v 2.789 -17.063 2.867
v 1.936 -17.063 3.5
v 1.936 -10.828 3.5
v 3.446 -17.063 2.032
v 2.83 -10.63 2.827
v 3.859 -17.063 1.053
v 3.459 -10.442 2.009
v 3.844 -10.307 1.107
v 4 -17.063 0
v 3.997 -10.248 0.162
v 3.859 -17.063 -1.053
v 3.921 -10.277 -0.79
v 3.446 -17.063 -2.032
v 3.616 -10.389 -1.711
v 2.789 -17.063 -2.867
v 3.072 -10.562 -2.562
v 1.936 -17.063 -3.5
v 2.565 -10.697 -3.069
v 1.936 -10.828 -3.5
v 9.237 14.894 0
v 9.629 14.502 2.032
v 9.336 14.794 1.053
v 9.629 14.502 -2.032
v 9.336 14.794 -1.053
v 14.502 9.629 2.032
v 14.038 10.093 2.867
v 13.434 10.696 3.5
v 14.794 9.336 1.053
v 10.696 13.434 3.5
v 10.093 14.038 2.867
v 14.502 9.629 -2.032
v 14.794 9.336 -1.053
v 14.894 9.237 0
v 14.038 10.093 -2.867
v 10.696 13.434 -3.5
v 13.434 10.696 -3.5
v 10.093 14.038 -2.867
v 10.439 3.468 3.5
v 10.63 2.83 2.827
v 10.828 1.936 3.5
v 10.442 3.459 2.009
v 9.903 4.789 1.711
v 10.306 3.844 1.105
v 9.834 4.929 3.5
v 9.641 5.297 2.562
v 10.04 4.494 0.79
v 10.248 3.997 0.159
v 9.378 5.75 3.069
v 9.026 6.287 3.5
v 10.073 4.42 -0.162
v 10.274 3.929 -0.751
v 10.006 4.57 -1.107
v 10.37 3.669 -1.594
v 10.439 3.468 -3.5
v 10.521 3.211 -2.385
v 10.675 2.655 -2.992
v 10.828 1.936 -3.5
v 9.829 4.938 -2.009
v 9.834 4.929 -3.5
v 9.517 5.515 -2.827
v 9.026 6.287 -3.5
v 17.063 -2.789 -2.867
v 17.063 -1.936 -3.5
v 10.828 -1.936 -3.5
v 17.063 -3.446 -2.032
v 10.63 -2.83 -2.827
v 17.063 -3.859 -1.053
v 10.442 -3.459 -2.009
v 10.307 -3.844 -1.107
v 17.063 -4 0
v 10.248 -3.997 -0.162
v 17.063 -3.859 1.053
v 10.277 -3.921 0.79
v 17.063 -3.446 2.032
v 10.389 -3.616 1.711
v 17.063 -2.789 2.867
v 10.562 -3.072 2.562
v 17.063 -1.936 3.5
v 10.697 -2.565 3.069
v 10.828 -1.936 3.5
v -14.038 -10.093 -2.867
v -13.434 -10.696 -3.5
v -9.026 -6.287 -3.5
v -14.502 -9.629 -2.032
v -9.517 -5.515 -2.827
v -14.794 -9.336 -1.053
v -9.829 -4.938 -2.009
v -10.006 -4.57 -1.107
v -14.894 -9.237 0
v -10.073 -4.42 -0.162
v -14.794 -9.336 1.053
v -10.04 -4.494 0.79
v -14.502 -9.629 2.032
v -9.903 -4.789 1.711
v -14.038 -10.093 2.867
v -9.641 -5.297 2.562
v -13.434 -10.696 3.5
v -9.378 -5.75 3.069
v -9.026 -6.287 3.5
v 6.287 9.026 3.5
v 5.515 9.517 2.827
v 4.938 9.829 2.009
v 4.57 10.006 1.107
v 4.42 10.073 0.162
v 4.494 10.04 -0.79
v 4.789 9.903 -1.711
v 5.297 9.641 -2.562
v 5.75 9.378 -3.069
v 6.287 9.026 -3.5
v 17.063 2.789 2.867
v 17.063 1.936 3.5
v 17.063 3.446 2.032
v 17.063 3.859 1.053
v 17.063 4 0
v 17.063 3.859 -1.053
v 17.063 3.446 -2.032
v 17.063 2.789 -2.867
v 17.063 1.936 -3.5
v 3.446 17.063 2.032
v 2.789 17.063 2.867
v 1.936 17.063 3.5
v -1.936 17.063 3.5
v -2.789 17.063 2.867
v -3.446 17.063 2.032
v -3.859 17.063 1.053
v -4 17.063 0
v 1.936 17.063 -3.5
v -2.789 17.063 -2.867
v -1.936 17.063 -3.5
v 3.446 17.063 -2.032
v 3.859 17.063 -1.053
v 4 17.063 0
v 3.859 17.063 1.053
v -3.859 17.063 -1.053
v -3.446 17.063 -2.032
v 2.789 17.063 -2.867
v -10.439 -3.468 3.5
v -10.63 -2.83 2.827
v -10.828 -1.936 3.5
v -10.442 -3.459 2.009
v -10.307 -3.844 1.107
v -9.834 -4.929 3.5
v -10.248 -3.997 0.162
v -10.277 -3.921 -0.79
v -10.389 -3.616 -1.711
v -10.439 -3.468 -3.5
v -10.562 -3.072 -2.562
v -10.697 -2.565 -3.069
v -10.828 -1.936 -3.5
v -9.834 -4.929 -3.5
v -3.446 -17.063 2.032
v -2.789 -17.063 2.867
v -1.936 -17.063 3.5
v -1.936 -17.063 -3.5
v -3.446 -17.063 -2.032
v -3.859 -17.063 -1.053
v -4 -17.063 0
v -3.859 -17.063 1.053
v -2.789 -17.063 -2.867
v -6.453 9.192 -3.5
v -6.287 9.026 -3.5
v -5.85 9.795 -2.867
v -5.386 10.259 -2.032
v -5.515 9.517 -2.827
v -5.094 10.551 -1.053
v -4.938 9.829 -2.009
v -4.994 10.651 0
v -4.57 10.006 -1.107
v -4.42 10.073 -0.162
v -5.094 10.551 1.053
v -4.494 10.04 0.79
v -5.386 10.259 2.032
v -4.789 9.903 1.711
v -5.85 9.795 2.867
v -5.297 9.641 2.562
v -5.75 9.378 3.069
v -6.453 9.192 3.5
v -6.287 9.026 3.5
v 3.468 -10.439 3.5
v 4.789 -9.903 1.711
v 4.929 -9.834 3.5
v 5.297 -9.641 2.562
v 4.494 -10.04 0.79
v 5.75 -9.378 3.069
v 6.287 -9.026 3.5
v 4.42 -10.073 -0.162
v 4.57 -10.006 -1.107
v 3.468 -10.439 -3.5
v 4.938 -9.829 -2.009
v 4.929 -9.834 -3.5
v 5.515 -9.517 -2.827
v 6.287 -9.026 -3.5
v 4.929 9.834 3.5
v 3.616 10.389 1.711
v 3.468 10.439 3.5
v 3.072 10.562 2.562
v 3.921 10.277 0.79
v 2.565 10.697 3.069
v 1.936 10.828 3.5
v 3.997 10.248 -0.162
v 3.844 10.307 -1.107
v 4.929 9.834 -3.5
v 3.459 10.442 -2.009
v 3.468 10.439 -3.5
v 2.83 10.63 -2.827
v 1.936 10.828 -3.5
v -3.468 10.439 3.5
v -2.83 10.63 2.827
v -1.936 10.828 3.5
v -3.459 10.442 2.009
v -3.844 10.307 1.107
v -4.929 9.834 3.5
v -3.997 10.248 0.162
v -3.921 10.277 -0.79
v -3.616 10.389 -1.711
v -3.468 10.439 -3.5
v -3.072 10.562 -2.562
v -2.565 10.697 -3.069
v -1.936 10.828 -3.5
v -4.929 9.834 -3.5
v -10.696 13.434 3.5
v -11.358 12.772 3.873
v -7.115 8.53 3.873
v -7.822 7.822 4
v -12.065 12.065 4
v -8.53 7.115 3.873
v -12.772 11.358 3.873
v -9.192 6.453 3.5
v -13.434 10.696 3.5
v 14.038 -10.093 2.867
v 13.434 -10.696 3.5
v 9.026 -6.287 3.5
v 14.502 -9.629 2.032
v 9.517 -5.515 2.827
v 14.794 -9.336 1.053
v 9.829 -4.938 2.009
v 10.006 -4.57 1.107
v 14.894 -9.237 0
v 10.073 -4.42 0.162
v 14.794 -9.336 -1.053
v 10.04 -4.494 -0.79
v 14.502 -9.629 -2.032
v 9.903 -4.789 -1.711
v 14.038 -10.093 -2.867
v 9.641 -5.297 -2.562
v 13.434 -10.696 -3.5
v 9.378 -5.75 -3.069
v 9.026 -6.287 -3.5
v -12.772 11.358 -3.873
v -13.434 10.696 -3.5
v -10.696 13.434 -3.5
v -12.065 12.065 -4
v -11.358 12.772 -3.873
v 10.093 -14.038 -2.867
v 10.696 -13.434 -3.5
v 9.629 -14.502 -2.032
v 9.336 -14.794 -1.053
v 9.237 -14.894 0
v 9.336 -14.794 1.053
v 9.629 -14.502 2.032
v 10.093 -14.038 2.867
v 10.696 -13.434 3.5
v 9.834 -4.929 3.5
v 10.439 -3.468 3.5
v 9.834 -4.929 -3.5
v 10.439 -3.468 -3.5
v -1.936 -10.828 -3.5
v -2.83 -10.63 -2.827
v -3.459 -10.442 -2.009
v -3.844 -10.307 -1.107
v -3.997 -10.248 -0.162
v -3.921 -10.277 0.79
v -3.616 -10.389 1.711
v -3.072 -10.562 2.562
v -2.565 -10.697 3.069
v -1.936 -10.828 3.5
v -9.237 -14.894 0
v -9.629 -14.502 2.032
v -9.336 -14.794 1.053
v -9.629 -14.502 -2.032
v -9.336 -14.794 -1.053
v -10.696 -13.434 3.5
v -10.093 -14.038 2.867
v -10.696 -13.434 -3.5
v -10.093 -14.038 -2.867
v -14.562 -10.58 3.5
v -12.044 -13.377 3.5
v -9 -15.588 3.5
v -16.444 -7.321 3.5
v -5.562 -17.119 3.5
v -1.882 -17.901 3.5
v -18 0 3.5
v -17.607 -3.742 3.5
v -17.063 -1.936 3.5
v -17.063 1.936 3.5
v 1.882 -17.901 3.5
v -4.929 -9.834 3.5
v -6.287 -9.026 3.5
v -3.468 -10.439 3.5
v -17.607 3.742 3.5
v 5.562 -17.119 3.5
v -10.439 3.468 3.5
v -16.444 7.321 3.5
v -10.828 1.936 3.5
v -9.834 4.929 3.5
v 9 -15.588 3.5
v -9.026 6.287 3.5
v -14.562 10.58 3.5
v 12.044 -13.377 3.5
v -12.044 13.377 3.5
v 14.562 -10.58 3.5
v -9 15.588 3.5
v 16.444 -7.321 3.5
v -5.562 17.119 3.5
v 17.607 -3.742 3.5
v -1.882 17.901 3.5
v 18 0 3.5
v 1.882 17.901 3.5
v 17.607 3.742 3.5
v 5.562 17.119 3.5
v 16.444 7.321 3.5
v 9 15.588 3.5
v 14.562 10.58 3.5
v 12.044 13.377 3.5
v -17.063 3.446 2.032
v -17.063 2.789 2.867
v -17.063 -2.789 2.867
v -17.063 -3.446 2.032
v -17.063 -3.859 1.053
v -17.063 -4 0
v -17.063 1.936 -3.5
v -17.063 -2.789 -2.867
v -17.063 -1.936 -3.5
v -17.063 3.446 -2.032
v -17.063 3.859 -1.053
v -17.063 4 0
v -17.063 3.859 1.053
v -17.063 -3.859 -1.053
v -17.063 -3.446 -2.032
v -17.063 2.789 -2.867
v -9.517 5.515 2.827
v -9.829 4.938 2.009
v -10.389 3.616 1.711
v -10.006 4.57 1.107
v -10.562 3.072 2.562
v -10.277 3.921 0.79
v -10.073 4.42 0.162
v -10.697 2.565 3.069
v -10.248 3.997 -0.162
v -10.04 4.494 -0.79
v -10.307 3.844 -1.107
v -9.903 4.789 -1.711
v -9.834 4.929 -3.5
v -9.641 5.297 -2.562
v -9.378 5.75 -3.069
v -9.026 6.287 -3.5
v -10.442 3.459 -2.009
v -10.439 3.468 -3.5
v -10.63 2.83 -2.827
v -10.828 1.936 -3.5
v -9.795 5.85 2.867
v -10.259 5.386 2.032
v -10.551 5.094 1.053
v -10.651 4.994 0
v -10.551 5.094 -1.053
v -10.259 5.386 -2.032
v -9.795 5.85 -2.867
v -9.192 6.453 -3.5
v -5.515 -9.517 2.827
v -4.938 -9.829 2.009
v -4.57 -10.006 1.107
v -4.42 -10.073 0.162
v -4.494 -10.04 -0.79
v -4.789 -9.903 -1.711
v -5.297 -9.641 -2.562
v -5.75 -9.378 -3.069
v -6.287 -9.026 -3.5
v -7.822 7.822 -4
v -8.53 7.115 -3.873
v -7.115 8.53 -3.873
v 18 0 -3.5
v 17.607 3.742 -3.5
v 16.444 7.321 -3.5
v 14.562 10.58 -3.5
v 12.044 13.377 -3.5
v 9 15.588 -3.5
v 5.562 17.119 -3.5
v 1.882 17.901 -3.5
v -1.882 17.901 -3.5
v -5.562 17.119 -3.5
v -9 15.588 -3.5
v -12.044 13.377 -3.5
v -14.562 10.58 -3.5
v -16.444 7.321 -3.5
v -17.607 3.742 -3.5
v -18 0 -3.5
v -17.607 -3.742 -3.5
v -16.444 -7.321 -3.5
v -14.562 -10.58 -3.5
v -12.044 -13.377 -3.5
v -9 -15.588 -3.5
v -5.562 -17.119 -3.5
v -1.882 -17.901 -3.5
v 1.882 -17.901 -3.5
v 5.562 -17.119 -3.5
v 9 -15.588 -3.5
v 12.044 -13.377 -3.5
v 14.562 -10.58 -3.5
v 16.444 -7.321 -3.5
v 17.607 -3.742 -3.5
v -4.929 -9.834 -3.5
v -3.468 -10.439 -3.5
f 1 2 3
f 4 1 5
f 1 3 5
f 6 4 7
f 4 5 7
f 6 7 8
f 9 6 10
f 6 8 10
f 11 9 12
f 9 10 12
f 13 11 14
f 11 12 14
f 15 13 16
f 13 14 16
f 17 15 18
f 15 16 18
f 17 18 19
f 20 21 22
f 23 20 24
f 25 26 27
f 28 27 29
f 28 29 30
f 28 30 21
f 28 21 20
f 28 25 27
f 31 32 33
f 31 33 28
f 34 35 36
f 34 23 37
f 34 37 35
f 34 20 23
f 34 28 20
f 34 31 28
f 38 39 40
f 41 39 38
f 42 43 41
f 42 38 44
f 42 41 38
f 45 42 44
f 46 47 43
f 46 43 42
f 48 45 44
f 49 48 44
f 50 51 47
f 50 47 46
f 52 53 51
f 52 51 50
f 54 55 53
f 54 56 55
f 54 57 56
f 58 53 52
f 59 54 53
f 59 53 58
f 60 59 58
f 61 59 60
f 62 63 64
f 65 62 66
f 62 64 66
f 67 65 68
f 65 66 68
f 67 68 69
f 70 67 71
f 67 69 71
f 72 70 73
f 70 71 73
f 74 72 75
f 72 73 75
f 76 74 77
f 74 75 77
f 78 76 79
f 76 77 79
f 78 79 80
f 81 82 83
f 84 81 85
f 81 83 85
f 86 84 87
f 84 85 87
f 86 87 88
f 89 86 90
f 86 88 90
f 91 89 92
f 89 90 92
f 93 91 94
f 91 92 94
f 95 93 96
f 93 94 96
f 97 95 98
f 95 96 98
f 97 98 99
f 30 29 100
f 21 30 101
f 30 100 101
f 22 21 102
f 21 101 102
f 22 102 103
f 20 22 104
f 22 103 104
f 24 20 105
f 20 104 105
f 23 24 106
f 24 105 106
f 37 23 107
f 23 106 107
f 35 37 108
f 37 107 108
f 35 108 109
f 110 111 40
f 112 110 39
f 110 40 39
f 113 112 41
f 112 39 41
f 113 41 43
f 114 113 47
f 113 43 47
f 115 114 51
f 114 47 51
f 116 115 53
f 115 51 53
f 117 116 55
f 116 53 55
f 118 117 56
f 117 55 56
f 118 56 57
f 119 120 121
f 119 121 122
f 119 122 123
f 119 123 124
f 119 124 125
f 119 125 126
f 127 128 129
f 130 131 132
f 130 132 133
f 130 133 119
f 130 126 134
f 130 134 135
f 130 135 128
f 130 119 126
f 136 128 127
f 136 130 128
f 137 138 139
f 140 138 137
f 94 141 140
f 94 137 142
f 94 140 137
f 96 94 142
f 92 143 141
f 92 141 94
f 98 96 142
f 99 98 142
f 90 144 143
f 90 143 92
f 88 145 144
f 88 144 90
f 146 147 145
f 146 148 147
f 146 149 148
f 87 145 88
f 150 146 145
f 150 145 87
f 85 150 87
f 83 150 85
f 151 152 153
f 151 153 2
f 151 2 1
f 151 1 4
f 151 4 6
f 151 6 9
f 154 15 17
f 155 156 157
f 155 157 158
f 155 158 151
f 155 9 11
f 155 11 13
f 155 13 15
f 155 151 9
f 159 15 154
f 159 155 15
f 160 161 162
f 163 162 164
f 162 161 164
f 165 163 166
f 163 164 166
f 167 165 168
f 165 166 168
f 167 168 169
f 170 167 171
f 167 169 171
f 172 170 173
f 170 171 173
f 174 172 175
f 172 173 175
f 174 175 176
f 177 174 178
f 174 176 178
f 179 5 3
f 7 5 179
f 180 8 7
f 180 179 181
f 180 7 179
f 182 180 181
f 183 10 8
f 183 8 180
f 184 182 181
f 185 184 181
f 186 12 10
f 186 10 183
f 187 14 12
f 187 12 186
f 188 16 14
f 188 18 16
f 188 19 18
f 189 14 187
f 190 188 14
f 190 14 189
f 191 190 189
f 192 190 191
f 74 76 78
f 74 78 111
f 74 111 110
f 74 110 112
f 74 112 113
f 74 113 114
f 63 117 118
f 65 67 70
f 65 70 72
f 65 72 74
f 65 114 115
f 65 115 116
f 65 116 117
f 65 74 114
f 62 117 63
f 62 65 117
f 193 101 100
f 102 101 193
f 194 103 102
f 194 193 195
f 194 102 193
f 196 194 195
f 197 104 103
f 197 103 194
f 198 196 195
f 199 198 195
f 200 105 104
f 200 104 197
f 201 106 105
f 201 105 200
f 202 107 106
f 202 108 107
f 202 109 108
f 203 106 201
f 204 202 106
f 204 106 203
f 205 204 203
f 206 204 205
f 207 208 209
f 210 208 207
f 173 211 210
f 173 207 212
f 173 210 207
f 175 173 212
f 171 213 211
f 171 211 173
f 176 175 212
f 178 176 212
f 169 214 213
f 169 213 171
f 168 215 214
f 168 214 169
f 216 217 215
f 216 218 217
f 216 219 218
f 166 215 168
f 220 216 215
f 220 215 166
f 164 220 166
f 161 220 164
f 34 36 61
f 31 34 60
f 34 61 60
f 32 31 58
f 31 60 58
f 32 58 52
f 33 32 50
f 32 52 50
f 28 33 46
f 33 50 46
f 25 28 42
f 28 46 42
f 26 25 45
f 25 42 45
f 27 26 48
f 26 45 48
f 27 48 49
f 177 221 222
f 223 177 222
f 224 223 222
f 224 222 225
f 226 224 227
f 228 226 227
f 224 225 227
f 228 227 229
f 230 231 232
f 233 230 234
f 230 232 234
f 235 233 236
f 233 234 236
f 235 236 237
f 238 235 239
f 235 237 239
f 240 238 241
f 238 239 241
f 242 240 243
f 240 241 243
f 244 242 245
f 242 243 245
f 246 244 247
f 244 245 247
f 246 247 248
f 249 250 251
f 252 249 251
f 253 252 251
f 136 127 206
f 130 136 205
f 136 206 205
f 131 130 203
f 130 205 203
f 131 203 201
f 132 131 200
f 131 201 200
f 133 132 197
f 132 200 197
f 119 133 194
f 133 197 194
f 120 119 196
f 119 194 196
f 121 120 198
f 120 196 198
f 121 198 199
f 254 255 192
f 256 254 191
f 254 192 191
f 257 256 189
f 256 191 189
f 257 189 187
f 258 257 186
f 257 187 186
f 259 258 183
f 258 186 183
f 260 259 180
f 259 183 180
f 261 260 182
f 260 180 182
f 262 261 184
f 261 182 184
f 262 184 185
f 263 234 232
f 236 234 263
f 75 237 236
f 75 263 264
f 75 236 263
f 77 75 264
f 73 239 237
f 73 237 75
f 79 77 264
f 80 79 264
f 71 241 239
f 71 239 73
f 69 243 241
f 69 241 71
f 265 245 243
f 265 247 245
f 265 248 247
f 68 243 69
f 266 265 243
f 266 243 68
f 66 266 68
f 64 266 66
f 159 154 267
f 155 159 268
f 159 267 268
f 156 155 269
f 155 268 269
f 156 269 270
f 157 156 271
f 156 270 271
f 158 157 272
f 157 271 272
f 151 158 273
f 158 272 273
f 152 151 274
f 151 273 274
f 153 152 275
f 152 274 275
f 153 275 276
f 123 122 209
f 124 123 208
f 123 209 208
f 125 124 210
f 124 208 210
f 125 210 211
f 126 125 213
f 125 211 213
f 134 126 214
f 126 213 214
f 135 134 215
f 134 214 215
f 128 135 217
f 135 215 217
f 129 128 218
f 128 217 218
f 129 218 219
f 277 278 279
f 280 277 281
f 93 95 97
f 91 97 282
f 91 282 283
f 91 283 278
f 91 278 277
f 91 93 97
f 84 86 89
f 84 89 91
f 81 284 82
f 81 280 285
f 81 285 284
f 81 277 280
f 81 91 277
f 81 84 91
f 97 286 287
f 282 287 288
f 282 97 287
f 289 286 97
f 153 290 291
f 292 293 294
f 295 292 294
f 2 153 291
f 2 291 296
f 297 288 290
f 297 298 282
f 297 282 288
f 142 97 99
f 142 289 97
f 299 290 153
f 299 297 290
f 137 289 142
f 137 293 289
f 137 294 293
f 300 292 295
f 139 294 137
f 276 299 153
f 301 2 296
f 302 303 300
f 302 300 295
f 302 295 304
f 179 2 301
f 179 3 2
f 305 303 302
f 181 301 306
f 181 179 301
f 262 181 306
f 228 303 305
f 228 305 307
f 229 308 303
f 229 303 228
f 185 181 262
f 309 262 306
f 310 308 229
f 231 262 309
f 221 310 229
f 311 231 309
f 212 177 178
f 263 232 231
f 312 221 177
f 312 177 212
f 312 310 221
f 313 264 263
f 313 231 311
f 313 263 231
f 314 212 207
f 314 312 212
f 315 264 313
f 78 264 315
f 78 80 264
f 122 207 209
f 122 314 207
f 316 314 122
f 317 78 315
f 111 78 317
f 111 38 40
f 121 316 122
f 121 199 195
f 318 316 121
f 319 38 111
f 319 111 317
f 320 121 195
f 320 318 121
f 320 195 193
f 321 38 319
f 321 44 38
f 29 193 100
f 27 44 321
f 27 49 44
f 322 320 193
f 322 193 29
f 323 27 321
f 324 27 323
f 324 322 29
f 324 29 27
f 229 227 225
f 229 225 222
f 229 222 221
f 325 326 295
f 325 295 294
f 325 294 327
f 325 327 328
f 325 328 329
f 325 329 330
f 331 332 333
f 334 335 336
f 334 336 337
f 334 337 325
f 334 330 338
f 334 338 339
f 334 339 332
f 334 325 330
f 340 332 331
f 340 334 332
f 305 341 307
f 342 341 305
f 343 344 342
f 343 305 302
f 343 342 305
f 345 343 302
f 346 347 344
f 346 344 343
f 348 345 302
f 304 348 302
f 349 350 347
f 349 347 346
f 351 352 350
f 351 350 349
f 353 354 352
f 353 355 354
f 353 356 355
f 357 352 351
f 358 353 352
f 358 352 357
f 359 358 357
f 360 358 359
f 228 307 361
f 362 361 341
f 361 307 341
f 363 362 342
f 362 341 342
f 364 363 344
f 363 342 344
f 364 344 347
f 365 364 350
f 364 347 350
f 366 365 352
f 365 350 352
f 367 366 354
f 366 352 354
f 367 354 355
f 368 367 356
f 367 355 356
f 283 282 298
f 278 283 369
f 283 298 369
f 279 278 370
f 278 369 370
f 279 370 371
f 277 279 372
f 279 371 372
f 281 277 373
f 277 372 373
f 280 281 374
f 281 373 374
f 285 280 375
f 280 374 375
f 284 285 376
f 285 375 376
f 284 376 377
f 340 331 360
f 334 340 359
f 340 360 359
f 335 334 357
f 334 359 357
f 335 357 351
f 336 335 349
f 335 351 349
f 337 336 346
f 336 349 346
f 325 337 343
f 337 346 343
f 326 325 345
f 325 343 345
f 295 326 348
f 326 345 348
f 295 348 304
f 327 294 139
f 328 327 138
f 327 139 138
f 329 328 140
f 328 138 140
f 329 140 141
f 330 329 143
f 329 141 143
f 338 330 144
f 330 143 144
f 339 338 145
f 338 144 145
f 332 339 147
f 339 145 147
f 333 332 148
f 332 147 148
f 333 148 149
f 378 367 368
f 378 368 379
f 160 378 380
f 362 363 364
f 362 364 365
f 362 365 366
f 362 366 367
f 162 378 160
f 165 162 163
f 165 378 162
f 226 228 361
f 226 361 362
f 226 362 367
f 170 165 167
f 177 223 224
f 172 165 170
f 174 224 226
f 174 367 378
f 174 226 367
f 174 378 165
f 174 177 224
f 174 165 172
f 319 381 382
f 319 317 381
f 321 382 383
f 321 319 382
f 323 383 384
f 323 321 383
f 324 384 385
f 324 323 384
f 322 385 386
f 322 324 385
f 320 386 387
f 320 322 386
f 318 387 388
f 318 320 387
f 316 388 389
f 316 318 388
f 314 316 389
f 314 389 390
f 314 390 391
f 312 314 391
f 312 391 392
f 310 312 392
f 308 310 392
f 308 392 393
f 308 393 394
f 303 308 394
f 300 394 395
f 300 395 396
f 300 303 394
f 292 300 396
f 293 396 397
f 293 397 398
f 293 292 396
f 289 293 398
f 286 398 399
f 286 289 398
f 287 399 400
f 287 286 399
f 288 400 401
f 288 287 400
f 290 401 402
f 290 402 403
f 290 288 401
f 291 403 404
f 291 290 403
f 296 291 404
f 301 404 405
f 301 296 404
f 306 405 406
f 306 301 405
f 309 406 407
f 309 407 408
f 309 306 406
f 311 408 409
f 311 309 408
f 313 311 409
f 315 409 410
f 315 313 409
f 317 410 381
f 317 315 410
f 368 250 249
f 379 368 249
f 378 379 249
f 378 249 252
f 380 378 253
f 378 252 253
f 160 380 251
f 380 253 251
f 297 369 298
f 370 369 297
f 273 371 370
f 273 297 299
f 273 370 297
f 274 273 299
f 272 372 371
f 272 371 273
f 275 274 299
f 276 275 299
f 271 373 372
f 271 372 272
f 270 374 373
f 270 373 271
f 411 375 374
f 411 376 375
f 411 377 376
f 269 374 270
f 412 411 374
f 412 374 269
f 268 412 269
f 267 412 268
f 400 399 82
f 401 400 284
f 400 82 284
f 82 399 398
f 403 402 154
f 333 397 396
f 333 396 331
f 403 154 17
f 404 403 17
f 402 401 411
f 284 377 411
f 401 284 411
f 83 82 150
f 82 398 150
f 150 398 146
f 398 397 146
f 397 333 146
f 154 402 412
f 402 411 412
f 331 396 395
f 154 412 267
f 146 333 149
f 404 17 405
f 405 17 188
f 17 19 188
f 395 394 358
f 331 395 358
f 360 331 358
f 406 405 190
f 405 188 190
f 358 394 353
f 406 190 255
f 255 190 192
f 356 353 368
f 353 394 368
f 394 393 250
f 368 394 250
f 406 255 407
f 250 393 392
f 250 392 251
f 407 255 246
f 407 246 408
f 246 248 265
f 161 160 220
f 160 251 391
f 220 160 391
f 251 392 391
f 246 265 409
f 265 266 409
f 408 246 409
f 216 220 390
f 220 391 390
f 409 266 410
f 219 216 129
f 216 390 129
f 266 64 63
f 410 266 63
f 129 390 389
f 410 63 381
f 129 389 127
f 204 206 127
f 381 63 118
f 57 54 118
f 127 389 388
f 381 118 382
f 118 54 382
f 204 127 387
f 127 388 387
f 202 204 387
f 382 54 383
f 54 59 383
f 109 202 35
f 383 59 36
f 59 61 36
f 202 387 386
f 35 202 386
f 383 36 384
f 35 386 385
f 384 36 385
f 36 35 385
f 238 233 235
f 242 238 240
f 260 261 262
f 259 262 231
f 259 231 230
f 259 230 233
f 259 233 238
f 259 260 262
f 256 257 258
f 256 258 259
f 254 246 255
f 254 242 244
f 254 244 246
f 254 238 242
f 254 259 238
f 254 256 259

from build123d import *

# Parameters (mm, degrees)
SKETCH1_R                   = 18
SKETCH1_R_2                 = 11
BOSS_EXTRUDE1_DEPTH         = 3.5
SKETCH4_R                   = 4
CUT_EXTRUDE1_DEPTH          = 6.9
CIRPATTERN1_COUNT           = 8
SKETCH5_R                   = 4
SPACECLAIM_FOR_MAGNET_DEPTH = 6


with BuildPart() as part:
    # Sketch1 → Boss-Extrude1 (new, symmetric)
    with BuildSketch(Plane.XY):
        Circle(SKETCH1_R)
        Circle(SKETCH1_R_2, mode=Mode.SUBTRACT)
    extrude(amount=BOSS_EXTRUDE1_DEPTH, both=True)

    # Sketch4 → Cut-Extrude1 (cut)
    with BuildSketch(Plane(origin=(-10.162674858, 0, 0), x_dir=(0, 0, -1), z_dir=(1, 0, 0))):
        Circle(SKETCH4_R)
    cut_extrude1 = extrude(amount=-CUT_EXTRUDE1_DEPTH, mode=Mode.SUBTRACT)

    # CirPattern1: Cut-Extrude1 ×8 about axis
    cirpattern1_axis = Axis((0, 0, 3.5), (0, 0, -1))
    for i in range(1, CIRPATTERN1_COUNT):
        add(cut_extrude1.rotate(cirpattern1_axis, i * 360 / CIRPATTERN1_COUNT), mode=Mode.SUBTRACT)

    # Sketch5 → SpaceClaim for Magnet (add)
    with BuildSketch(Plane(origin=(-12.065133097, 12.065133097, 0), x_dir=(0.7071067811865487, 0.7071067811865465, 0), z_dir=(0.7071067811865465, -0.7071067811865487, 0))):
        Circle(SKETCH5_R)
    extrude(amount=SPACECLAIM_FOR_MAGNET_DEPTH)


solid = part.part
